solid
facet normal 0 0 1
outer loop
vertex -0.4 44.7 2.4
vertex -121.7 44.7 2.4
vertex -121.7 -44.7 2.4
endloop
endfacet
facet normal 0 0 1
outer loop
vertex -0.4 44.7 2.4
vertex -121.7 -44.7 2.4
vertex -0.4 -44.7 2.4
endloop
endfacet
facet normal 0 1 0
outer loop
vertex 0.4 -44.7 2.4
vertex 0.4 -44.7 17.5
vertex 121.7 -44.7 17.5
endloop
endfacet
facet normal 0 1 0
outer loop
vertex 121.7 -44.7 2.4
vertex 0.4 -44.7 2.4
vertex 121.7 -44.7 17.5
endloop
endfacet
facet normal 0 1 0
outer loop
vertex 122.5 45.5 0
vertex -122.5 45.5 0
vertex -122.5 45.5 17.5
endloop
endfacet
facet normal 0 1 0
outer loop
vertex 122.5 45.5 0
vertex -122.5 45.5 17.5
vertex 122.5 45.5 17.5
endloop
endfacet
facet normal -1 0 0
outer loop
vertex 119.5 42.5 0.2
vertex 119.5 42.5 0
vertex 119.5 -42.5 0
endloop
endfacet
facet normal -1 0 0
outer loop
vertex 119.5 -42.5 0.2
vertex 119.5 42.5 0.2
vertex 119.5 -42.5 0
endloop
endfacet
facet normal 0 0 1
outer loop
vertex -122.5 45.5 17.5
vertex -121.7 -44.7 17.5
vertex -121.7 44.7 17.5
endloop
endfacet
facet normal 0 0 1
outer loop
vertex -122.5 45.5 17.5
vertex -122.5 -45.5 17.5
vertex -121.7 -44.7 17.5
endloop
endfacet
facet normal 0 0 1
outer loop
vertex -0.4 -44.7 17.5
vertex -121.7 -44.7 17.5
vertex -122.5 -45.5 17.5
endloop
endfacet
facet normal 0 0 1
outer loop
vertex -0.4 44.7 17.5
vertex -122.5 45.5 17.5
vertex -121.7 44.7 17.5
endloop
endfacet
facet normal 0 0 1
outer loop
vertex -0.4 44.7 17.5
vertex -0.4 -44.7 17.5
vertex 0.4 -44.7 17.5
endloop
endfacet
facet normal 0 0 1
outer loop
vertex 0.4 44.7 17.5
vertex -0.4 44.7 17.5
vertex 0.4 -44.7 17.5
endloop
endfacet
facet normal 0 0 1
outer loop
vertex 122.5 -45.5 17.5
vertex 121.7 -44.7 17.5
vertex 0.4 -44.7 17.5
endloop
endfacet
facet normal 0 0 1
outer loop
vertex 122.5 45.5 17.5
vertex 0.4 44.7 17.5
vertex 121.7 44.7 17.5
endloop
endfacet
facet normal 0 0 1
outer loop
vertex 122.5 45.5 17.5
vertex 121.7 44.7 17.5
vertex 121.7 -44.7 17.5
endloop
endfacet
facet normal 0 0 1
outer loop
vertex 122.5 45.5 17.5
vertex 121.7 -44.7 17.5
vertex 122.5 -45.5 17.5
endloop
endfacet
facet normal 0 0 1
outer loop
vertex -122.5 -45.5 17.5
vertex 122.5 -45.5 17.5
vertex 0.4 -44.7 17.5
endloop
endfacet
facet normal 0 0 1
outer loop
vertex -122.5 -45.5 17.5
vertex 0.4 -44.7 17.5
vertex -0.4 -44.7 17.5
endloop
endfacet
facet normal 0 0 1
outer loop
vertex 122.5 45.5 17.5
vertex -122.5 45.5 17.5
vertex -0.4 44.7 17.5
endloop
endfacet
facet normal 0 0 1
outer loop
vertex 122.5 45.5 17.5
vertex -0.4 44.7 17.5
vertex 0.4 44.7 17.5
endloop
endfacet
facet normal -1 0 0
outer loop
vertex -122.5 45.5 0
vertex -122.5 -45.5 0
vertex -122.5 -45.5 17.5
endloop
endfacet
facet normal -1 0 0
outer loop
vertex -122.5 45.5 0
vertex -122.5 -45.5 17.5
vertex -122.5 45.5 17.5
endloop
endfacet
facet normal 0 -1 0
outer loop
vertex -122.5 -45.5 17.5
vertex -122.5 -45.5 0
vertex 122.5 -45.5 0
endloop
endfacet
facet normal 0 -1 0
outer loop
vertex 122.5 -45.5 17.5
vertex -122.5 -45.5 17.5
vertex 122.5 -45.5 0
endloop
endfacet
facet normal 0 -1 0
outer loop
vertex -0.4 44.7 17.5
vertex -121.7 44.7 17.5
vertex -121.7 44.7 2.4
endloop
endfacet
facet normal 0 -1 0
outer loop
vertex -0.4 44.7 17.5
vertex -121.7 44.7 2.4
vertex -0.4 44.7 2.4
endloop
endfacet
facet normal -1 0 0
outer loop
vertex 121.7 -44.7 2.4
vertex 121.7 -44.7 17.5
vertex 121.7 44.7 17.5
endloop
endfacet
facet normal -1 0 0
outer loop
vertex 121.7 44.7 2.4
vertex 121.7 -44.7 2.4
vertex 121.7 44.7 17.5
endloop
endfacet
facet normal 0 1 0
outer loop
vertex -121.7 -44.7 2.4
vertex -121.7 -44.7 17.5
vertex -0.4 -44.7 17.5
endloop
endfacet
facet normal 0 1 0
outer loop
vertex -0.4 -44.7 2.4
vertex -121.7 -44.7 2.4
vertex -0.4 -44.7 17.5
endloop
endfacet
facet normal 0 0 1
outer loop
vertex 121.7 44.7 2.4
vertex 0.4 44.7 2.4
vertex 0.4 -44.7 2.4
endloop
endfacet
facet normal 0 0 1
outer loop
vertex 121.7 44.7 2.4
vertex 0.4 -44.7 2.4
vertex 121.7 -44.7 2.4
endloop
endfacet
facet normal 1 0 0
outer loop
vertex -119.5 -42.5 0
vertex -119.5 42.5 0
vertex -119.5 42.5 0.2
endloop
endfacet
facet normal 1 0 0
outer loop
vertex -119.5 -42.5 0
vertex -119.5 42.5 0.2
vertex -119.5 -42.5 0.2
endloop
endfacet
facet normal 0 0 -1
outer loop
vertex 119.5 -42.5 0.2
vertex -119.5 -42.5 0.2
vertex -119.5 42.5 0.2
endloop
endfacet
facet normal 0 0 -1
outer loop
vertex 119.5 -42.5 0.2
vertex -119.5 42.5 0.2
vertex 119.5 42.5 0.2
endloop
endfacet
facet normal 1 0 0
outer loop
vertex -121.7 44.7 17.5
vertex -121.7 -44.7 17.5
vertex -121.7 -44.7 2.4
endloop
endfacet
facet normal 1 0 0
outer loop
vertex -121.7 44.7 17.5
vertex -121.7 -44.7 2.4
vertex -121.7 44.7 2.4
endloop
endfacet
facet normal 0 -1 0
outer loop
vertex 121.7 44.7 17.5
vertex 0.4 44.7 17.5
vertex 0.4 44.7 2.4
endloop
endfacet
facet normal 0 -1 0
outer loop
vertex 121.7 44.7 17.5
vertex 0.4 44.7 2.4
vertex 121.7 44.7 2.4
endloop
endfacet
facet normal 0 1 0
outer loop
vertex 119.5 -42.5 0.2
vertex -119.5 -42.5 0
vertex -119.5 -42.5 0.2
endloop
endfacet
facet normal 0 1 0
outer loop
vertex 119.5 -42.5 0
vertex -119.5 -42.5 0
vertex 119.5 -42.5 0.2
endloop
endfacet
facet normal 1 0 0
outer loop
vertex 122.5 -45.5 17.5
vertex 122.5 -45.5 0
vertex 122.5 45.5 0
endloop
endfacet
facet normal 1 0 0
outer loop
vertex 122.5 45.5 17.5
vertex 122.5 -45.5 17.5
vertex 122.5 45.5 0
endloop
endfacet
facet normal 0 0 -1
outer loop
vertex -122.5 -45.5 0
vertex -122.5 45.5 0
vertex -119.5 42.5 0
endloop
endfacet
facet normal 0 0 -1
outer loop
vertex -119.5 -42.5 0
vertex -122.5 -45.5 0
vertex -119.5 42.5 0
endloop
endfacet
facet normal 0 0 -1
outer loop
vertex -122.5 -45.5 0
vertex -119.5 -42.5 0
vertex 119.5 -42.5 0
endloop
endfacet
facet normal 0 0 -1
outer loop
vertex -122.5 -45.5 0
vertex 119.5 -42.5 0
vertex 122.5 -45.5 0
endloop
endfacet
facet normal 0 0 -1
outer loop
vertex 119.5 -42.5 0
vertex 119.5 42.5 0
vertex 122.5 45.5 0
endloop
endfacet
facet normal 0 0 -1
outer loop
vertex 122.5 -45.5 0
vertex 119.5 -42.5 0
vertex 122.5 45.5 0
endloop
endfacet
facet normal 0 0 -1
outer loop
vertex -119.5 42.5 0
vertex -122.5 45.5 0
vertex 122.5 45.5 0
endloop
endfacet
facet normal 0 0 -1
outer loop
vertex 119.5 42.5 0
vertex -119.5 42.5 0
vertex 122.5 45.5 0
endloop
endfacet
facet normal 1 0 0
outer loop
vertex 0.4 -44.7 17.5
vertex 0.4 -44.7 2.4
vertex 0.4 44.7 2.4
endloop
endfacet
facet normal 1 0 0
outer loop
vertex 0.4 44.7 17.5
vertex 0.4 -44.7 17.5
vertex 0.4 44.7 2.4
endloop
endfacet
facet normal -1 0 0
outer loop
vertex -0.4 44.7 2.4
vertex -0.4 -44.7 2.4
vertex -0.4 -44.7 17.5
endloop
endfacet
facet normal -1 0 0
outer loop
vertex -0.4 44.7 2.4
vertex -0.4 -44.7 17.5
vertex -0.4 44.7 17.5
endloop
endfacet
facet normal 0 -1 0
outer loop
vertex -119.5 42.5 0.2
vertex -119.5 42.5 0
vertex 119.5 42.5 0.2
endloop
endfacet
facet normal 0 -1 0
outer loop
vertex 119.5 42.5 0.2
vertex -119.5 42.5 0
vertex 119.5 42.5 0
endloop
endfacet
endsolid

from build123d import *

# Parameters (mm, degrees)
F0_W     = 245
F0_H     = 91
F1_DEPTH = 17.5
F2_W     = 243.4
F2_H     = 89.4
F3_DEPTH = 15.1
F4_W     = 0.8
F4_H     = 89.4
F5_DEPTH = 15.1
F6_W     = 239
F6_H     = 85
F7_DEPTH = 0.2


with BuildPart() as f1:
    # F0 (on Top) → F1 (new body)
    with BuildSketch(Plane.XY):
        Rectangle(F0_W, F0_H)
    extrude(amount=F1_DEPTH)

    # F2 (on face) → F3 (cut)
    with BuildSketch(Plane.XY.offset(17.5)):
        Rectangle(F2_W, F2_H)
    extrude(amount=-F3_DEPTH, mode=Mode.SUBTRACT)

    # F4 (on face) → F5 (join)
    with BuildSketch(Plane.XY.offset(2.4)):
        Rectangle(F4_W, F4_H)
    extrude(amount=F5_DEPTH)

    # F6 (on face) → F7 (cut)
    with BuildSketch(Plane(origin=(0, 0, 0), x_dir=(1, 0, 0), z_dir=(0, 0, -1))):
        Rectangle(F6_W, F6_H)
    extrude(amount=-F7_DEPTH, mode=Mode.SUBTRACT)


solid = f1.part
